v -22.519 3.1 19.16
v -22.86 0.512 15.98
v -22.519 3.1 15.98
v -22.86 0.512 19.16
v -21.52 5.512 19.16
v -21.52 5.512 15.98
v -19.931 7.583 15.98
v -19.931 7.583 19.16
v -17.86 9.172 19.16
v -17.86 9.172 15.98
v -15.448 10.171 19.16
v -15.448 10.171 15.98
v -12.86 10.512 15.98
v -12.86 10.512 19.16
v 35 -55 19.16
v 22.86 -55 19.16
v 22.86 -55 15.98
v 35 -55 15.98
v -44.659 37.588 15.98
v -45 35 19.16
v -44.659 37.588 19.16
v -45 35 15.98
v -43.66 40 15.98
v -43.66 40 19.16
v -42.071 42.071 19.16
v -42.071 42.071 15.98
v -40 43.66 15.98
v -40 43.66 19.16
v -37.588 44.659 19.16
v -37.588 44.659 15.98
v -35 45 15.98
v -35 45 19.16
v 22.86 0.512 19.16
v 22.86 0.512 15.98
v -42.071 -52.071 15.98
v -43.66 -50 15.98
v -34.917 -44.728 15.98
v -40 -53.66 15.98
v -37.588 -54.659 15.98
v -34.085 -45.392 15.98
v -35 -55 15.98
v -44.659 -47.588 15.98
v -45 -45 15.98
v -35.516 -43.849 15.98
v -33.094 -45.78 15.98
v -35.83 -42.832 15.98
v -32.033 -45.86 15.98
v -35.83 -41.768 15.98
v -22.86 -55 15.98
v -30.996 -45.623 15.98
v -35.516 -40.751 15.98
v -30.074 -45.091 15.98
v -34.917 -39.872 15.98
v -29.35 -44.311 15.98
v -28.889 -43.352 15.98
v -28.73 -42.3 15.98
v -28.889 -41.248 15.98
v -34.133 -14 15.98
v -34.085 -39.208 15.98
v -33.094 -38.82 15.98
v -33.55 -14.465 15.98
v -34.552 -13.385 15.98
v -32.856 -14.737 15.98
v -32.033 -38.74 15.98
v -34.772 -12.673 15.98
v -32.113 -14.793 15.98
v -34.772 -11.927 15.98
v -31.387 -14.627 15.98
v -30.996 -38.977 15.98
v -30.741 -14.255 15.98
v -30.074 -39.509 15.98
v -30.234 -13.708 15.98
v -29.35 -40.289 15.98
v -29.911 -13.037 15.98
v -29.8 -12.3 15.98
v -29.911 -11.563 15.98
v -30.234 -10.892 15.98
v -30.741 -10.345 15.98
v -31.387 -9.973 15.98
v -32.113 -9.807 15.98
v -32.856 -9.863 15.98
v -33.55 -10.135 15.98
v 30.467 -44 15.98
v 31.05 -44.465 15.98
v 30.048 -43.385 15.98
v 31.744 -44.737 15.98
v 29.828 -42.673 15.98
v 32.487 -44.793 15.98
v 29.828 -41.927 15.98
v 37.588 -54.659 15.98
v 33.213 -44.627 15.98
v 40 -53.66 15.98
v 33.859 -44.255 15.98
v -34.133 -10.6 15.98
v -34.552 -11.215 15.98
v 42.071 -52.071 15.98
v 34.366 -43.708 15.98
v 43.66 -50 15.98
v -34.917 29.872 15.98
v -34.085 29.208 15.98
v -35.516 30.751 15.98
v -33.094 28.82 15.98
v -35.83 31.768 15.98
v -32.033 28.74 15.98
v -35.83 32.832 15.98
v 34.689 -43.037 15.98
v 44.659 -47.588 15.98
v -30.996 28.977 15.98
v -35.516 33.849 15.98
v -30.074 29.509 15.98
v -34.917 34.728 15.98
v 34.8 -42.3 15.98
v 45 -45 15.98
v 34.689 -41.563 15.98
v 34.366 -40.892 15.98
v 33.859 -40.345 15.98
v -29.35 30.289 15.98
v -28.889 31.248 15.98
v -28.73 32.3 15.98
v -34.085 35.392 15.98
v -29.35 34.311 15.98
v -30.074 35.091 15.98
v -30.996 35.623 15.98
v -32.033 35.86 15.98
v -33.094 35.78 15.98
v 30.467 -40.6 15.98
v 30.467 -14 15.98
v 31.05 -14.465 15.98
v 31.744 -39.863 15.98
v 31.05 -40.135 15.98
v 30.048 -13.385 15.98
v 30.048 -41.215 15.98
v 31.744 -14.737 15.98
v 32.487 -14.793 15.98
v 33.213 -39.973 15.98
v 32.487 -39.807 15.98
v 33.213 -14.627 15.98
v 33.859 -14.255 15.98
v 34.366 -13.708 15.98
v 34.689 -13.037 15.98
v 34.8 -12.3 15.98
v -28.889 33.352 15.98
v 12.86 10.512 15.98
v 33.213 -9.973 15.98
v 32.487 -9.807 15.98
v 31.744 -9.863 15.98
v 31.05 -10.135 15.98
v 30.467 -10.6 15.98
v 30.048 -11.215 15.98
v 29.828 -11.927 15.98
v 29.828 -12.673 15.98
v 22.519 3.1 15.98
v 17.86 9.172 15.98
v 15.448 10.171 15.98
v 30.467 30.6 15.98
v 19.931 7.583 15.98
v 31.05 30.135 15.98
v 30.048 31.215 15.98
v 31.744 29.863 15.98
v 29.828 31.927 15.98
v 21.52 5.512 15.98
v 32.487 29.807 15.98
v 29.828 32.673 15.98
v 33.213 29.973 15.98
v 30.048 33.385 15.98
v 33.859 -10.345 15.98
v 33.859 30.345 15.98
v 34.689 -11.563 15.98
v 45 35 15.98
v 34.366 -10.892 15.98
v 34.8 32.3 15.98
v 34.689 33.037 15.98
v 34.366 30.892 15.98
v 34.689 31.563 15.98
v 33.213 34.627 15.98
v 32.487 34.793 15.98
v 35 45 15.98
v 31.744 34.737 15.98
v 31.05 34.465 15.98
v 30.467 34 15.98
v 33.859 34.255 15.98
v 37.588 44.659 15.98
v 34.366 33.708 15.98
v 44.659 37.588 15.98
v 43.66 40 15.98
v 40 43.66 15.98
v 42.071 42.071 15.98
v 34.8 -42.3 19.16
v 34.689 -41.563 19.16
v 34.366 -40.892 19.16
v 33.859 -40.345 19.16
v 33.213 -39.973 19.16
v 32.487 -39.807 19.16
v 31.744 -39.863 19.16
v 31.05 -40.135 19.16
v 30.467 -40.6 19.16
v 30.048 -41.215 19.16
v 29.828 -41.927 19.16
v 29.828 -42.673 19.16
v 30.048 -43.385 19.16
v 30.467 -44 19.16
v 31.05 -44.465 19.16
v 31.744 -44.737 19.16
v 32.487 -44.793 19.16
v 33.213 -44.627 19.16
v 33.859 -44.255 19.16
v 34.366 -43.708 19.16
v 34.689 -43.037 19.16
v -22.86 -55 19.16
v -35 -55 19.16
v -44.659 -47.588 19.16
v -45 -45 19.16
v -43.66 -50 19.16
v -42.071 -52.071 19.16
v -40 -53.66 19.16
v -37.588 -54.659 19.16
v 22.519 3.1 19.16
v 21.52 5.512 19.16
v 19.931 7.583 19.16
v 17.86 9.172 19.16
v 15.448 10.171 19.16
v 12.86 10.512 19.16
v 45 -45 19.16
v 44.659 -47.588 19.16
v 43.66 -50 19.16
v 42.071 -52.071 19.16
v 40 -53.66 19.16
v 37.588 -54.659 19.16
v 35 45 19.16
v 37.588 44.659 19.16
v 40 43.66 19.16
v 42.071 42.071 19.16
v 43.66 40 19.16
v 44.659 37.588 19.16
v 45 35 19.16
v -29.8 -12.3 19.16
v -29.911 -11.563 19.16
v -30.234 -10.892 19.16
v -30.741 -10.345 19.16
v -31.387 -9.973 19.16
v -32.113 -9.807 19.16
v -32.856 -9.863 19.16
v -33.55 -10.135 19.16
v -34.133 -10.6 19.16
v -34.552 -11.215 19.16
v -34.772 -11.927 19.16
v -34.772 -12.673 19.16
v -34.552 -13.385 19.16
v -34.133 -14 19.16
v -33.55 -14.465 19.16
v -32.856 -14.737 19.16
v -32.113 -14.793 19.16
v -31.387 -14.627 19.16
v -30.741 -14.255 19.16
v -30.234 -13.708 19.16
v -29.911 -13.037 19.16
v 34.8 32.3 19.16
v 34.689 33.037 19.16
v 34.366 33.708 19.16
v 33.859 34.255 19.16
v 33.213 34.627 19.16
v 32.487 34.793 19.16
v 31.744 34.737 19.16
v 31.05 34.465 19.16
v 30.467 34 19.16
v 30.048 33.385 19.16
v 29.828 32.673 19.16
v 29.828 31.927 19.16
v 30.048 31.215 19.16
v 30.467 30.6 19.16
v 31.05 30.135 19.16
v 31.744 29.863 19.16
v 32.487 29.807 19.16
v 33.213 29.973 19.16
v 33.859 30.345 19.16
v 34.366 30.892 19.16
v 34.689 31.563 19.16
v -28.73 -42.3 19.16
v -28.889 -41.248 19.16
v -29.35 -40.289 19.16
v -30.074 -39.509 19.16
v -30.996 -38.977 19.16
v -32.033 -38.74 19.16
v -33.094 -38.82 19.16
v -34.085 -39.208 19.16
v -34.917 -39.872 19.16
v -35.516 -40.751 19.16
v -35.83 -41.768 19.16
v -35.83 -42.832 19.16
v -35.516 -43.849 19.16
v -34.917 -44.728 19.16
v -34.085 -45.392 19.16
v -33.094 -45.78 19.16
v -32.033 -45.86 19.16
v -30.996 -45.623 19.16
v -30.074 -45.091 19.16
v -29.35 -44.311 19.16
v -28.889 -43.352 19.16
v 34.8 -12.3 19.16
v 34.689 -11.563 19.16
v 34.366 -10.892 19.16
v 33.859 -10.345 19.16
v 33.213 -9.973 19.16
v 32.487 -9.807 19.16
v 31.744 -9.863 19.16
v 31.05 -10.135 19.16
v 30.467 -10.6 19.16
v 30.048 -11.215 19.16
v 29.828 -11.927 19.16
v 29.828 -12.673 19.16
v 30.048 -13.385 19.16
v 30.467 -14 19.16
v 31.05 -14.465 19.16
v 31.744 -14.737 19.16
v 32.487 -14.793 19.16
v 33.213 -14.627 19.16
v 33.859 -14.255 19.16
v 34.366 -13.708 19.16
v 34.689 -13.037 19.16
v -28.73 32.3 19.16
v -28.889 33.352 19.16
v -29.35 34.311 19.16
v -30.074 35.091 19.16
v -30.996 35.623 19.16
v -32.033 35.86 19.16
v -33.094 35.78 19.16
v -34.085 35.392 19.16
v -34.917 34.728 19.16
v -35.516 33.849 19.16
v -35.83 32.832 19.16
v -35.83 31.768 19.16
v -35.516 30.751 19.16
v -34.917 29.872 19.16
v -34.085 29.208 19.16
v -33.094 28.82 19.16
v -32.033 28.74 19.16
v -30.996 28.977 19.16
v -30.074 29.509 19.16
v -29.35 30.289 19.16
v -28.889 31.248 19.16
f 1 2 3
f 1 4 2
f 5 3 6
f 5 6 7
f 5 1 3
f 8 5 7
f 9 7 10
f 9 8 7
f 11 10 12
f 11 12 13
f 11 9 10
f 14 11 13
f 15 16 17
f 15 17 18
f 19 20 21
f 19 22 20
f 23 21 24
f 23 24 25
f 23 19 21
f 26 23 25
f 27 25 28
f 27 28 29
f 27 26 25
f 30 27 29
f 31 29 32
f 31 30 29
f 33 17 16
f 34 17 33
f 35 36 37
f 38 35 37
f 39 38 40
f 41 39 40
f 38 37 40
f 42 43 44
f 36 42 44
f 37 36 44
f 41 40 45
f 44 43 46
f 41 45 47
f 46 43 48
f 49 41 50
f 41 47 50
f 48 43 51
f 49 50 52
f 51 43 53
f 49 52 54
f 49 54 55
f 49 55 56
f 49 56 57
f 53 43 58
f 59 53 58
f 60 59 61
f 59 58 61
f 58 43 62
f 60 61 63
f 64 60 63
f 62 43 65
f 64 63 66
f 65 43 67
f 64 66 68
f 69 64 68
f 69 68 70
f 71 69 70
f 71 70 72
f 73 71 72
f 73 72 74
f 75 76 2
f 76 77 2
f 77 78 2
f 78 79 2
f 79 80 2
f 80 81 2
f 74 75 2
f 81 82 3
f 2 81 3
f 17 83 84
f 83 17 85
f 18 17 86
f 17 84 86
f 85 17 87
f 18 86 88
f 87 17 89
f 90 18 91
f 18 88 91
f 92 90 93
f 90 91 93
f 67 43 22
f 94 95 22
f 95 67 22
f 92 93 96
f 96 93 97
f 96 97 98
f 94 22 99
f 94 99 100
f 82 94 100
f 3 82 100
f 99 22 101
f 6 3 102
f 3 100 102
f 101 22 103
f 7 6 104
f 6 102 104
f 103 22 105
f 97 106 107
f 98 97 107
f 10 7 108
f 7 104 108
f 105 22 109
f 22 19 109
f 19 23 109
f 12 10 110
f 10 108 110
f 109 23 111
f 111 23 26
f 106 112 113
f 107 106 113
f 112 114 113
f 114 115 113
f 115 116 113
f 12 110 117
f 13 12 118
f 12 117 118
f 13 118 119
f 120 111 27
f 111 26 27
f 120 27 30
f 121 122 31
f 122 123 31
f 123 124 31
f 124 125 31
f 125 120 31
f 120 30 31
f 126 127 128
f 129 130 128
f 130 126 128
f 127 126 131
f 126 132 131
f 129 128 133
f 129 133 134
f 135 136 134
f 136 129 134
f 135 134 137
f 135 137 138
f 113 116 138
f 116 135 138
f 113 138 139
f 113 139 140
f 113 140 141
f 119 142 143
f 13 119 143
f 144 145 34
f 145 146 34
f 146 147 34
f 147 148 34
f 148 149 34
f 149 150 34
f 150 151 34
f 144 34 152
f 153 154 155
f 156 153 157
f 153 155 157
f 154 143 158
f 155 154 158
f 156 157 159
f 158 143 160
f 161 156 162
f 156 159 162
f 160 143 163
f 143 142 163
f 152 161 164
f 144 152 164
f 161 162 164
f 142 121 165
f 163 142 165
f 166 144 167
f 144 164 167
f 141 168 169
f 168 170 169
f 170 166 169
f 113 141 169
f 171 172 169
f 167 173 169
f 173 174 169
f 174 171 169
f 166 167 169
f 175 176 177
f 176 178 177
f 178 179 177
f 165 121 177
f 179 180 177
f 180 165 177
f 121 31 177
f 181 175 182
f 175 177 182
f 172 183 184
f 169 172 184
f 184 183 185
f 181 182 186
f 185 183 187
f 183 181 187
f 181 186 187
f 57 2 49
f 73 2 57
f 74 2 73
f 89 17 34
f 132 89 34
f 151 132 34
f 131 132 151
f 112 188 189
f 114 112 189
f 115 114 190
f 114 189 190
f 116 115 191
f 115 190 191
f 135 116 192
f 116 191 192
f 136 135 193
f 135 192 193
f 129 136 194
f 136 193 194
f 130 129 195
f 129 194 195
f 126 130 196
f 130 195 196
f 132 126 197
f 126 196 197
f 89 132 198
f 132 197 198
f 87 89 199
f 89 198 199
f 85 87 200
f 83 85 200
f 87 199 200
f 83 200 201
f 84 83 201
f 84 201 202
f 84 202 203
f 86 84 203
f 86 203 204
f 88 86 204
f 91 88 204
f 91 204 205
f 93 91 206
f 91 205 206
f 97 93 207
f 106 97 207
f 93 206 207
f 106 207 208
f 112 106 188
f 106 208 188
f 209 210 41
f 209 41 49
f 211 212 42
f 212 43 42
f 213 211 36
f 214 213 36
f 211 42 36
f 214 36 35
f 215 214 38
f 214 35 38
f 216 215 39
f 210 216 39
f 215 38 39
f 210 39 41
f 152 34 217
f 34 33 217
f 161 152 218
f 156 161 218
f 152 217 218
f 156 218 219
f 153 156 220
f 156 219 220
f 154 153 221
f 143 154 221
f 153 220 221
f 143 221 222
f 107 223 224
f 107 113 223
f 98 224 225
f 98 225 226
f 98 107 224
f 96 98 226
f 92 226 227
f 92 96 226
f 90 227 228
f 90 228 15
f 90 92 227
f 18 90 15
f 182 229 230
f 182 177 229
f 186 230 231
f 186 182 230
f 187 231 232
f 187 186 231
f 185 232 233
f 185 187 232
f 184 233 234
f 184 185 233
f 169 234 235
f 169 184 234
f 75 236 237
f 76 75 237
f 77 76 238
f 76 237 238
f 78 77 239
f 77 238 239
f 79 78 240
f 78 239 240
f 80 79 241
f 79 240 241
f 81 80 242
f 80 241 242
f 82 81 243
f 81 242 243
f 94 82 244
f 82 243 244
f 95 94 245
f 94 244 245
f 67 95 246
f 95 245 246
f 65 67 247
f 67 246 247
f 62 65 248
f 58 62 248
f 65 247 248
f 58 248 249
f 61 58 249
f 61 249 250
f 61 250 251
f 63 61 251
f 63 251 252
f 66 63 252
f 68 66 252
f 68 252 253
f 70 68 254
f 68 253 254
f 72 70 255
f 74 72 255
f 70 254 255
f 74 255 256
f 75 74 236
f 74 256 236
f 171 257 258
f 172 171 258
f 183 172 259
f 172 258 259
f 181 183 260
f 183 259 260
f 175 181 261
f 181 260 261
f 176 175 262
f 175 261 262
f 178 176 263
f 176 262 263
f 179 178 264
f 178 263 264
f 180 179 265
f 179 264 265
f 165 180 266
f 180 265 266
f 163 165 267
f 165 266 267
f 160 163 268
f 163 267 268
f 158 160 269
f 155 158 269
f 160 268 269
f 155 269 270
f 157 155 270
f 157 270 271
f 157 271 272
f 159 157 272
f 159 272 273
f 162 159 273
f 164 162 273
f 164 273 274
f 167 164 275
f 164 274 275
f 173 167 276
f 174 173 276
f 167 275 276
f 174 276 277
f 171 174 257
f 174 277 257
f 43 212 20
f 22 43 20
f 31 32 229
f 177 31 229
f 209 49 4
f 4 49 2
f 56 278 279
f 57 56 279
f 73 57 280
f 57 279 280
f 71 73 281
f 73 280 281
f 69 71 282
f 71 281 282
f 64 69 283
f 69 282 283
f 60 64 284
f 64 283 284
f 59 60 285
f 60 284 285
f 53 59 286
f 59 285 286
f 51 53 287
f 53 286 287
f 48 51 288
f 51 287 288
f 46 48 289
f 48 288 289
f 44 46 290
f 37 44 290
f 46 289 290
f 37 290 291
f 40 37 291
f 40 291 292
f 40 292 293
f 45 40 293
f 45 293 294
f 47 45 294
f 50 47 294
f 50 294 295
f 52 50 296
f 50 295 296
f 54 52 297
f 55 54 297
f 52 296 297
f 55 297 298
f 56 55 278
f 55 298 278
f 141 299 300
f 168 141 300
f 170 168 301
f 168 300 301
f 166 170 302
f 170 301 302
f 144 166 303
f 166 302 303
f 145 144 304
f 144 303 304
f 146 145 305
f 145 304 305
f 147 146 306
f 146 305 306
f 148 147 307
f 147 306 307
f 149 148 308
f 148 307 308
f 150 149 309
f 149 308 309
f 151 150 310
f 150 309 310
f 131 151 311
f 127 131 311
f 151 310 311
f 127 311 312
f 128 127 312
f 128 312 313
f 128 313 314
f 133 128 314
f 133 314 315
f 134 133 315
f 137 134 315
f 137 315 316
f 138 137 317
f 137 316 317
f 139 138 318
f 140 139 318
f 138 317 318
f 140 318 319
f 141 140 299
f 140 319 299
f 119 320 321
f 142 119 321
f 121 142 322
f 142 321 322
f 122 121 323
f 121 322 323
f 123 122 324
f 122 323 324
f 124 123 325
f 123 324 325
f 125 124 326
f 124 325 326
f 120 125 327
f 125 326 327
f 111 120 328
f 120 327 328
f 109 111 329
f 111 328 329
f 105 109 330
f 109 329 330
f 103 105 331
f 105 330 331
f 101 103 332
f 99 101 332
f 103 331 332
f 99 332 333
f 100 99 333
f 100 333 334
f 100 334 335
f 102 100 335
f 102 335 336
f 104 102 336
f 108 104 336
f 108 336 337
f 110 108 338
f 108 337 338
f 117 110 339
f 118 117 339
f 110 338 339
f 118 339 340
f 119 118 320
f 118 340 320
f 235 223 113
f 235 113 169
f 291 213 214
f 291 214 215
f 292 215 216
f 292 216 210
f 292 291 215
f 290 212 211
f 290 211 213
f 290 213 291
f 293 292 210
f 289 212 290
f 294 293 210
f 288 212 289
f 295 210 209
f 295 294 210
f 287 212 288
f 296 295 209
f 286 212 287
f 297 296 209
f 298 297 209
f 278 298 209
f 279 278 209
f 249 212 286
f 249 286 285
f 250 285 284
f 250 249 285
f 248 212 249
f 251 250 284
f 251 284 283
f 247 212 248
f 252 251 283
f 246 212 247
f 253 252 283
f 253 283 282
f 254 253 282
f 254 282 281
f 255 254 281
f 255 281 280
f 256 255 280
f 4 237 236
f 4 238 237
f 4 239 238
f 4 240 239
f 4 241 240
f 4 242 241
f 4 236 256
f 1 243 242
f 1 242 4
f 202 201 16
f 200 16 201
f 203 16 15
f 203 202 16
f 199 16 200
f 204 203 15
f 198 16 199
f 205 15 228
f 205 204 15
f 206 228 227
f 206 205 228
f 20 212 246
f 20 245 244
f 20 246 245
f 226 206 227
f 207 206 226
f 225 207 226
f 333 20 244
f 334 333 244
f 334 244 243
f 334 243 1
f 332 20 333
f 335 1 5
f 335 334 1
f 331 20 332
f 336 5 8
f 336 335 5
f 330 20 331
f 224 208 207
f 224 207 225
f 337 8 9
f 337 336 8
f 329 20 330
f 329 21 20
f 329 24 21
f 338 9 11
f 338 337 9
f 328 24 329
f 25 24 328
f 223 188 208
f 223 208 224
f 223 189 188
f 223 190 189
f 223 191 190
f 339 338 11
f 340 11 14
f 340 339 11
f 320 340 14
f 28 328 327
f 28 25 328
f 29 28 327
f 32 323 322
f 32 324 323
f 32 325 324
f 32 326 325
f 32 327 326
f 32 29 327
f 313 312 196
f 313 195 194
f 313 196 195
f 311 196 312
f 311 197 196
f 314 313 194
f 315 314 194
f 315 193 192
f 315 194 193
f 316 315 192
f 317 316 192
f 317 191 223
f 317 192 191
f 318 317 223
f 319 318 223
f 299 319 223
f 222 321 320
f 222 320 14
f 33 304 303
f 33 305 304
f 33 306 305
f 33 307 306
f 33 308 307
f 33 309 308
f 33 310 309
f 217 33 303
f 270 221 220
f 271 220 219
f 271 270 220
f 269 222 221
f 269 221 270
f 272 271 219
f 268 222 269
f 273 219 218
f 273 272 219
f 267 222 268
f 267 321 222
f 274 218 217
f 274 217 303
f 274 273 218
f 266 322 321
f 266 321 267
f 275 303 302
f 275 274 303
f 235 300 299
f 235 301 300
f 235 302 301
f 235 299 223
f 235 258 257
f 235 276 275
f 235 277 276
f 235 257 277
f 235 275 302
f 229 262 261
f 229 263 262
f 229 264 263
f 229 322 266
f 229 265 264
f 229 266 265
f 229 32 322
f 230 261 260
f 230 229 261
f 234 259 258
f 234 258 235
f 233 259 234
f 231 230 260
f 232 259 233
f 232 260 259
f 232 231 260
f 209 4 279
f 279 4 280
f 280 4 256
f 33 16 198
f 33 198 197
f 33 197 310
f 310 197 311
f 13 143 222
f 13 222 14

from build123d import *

# Parameters (mm, degrees)
BOSS_EXTRUDE1_START = 19.16
SKETCH1_W           = 90
SKETCH1_H           = 100
SKETCH1_R           = 2.5
SKETCH1_R_2         = 3.57
BOSS_EXTRUDE1_DEPTH = 3.18
SKETCH2_W           = 45.72
SKETCH2_H           = 65.511870912
CUT_EXTRUDE1_DEPTH  = 72.134467033
FILLET1_R           = 10


with BuildPart() as part:
    # Sketch1 → Boss-Extrude1 (new body)
    with BuildSketch(Plane.XY.offset(BOSS_EXTRUDE1_START)):
        with Locations((0, -5)):
            Rectangle(SKETCH1_W, SKETCH1_H)
        with Locations((32.3, -12.3)):
            Circle(SKETCH1_R, mode=Mode.SUBTRACT)
        with Locations((32.3, -42.3)):
            Circle(SKETCH1_R, mode=Mode.SUBTRACT)
        with Locations((-32.3, -42.3)):
            Circle(SKETCH1_R_2, mode=Mode.SUBTRACT)
        with Locations((-32.3, -12.3)):
            Circle(SKETCH1_R, mode=Mode.SUBTRACT)
        with Locations((-32.3, 32.3)):
            Circle(SKETCH1_R_2, mode=Mode.SUBTRACT)
        with Locations((32.3, 32.3)):
            Circle(SKETCH1_R, mode=Mode.SUBTRACT)
    extrude(amount=-BOSS_EXTRUDE1_DEPTH)

    # Sketch2 → Cut-Extrude1 (cut, through all)
    with BuildSketch(Plane(origin=(0, 0, 15.98), x_dir=(-1, 0, 0), z_dir=(0, 0, -1))):
        with Locations((0, -22.244064544)):
            Rectangle(SKETCH2_W, SKETCH2_H)
    extrude(amount=-CUT_EXTRUDE1_DEPTH, mode=Mode.SUBTRACT)

    # Fillet1
    fillet1_edges = [part.edges().sort_by_distance(p)[0] for p in [
        (22.86, 10.511870912, 17.57),
        (-22.86, 10.511870912, 17.57),
        (-45, 45, 17.57),
        (45, 45, 17.57),
        (45, -55, 17.57),
        (-45, -55, 17.57),
    ]]
    fillet(fillet1_edges, radius=FILLET1_R)


solid = part.part
